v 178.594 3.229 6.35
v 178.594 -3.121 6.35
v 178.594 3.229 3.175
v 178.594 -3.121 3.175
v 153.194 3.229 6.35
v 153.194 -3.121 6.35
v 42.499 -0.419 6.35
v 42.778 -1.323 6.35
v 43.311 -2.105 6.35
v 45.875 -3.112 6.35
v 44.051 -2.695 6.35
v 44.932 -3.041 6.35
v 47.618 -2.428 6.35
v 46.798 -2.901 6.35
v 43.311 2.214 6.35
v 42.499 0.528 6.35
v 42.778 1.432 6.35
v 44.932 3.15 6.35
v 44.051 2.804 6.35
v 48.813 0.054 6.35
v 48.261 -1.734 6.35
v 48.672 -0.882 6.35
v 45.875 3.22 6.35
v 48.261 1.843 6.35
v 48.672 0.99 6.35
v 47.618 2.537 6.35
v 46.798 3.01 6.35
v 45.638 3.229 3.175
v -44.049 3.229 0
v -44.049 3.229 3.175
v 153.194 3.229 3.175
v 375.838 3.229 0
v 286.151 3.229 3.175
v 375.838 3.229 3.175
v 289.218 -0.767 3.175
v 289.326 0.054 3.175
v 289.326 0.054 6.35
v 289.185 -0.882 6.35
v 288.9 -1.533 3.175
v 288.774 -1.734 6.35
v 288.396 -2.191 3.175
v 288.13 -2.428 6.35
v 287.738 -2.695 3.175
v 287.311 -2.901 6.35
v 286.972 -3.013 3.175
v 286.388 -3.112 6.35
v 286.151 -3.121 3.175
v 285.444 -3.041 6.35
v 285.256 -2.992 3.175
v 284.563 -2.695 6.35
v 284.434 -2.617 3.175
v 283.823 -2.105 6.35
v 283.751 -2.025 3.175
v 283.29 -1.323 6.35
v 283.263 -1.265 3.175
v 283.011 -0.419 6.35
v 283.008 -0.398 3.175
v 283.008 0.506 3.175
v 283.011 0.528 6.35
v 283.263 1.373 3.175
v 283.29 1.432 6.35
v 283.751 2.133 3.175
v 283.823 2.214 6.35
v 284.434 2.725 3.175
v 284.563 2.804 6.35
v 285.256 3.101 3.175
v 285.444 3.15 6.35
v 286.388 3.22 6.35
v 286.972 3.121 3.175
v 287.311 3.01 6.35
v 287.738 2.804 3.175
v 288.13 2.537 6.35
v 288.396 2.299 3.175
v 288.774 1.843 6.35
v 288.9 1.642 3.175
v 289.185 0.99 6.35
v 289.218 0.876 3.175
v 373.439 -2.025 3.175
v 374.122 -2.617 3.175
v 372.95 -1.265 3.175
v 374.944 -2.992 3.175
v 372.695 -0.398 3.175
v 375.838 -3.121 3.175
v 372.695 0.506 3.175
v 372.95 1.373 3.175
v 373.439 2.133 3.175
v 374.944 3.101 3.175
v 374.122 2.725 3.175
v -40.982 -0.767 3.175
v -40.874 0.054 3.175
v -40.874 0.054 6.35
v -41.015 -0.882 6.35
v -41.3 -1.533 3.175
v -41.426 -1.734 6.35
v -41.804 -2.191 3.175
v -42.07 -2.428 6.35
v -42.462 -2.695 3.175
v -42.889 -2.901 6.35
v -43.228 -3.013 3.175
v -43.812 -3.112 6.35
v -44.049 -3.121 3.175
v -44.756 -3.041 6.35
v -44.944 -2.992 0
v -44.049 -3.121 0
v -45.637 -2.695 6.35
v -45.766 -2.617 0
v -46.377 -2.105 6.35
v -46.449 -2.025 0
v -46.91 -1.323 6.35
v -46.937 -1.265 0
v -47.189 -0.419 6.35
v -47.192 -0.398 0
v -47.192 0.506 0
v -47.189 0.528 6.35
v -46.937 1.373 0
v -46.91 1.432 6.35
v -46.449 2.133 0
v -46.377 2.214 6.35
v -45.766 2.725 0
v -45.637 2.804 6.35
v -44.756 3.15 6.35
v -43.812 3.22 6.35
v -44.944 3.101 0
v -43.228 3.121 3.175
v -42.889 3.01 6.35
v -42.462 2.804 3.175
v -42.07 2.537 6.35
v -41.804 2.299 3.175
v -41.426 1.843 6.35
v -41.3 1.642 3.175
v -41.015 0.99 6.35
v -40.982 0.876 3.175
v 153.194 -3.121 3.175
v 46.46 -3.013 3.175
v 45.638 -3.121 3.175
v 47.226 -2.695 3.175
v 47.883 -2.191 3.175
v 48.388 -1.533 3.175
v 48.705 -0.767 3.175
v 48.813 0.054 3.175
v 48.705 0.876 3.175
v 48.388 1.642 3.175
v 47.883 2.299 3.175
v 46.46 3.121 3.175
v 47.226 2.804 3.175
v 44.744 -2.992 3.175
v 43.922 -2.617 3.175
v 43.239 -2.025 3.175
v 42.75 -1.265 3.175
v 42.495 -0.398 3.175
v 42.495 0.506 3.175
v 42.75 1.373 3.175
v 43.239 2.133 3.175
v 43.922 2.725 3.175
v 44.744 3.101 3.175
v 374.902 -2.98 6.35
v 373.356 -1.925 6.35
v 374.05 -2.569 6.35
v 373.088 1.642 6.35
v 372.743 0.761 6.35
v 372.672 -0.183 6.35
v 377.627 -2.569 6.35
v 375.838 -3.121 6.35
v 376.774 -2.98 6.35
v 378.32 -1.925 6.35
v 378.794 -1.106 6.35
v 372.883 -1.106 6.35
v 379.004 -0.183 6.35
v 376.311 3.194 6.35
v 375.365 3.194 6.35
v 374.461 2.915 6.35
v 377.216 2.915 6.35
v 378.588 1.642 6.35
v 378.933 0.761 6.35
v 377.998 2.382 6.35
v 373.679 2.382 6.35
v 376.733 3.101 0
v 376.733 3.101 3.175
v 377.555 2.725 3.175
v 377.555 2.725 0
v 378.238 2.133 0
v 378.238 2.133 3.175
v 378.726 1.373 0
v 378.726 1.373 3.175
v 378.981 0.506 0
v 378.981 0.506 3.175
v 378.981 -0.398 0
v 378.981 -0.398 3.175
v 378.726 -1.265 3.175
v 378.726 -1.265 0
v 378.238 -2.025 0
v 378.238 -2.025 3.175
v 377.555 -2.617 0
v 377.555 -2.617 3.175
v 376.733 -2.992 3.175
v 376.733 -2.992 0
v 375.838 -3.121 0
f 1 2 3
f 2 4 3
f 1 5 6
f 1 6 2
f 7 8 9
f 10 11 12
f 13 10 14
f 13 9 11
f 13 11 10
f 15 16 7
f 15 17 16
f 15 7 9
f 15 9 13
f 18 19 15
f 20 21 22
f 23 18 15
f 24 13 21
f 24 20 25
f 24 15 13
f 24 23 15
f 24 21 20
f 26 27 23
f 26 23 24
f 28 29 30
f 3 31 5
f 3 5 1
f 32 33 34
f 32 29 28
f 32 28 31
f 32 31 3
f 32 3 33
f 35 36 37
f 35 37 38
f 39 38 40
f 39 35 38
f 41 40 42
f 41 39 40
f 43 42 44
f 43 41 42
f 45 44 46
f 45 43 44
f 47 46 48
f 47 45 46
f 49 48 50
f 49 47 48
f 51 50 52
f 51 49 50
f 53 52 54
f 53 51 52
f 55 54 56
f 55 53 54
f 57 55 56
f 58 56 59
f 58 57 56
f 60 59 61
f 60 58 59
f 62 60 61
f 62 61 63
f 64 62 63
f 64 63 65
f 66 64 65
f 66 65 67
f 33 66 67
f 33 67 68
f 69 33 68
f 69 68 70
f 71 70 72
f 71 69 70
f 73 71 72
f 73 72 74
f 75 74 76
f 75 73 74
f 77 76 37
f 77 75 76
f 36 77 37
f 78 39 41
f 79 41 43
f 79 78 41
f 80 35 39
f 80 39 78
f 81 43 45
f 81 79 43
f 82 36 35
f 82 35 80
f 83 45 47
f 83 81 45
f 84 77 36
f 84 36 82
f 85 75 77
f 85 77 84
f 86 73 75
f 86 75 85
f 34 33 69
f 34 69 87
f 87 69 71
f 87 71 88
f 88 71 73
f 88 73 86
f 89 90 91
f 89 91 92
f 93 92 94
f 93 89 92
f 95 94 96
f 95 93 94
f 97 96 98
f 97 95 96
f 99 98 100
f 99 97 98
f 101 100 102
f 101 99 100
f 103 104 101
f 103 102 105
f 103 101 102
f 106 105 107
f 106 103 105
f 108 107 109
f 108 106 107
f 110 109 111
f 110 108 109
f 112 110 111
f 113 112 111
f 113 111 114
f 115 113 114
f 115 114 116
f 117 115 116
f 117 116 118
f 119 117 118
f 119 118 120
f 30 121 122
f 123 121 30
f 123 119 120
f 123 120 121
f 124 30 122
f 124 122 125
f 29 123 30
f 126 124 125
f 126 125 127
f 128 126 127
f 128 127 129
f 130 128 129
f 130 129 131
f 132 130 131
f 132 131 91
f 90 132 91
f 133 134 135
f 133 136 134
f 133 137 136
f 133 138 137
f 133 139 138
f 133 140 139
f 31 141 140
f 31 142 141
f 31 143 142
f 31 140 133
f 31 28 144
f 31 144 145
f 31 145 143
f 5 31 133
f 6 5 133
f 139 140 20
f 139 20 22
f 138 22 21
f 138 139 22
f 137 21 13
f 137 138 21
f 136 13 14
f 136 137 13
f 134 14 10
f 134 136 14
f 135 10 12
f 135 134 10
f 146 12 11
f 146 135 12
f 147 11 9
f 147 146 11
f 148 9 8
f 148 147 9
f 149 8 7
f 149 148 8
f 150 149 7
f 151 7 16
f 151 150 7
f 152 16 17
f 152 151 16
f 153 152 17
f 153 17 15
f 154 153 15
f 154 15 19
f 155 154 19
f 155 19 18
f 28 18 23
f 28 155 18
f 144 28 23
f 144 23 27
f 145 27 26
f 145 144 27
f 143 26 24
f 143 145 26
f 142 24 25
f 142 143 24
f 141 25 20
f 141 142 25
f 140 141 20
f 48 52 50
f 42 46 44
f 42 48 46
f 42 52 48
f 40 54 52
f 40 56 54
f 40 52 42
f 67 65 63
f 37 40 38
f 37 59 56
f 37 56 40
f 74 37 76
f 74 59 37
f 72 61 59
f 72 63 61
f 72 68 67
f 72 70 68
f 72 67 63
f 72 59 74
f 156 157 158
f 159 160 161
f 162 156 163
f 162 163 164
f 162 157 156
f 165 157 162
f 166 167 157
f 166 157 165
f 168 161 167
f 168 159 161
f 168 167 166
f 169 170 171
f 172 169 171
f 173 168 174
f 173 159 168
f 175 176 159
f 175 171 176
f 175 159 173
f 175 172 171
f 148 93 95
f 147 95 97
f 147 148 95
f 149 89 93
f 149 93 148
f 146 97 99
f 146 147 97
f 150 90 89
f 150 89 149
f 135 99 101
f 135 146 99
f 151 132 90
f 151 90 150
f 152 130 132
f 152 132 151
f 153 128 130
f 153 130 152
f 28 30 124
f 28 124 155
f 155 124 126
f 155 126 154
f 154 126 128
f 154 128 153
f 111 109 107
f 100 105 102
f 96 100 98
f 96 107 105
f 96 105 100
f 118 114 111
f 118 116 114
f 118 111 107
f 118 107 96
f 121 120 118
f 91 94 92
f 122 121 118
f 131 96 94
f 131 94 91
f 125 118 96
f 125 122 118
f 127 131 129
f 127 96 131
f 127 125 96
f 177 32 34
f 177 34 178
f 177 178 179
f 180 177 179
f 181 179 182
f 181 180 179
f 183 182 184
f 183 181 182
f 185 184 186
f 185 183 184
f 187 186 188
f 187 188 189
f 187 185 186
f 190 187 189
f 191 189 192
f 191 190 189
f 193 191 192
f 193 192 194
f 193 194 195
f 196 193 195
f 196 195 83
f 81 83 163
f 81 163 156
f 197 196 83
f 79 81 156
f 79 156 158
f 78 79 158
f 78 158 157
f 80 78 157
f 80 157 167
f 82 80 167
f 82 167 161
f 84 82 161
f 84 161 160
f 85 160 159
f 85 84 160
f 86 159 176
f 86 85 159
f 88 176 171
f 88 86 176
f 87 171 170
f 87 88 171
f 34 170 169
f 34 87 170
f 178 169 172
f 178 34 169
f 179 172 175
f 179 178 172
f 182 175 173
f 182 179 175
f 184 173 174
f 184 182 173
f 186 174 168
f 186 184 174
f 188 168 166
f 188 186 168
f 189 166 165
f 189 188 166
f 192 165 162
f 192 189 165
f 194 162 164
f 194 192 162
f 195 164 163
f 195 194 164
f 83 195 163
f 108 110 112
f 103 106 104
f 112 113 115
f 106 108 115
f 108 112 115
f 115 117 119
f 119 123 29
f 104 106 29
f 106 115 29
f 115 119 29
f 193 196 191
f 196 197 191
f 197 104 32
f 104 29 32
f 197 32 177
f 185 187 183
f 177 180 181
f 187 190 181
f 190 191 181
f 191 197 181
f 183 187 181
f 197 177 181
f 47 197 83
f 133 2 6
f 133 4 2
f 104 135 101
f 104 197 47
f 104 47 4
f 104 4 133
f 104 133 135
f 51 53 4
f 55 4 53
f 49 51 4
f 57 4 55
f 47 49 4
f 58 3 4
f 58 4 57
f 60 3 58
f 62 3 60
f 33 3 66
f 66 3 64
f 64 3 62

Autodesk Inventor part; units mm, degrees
ref_plane "YZ Plane" through (0, 0, 0) normal (1, 0, 0) x (0, 1, 0)
ref_plane "XZ Plane" through (0, 0, 0) normal (0, 1, 0) x (-1, 0, 0)
ref_plane "XY Plane" through (0, 0, 0) normal (0, 0, 1) x (1, 0, 0)
sketch "Sketch1" plane through (0, 0, 0) normal (0, 0, 1) x (1, 0, 0)
  line L0 (-44.0493, 3.2293) -> (375.8381, 3.2293)
  line L1 (375.8381, 3.2293) -> (375.8381, -3.1207)
  line L2 (375.8381, -3.1207) -> (-44.0493, -3.1207)
  line L3 (-44.0493, -3.1207) -> (-44.0493, 3.2293)
  circle A0 centre (-44.0493, 0.0543) radius 3.175
  circle A1 centre (375.8381, 0.0543) radius 3.175
  point P0 (0, 0)
  dimension "d0" = 419.8874
  dimension "d1" = 6.35
extrude "Extrusion1" add sketch "Sketch1" along normal blind 3.175
sketch "Sketch2" plane through (0, 0, 3.175) normal (0, 0, 1) x (1, 0, 0)
  arc A0 (375.8381, -3.1207) -> (375.8381, 3.2293) centre (375.8381, 0.0543) ccw projected
  line L0 (-44.0493, 3.2293) -> (375.8381, 3.2293) projected
  arc A1 (-44.0493, 3.2293) -> (-44.0493, -3.1207) centre (-44.0493, 0.0543) ccw projected
  line L1 (375.8381, -3.1207) -> (-44.0493, -3.1207) projected
  circle A2 centre (-44.0493, 0.0543) radius 3.175
  circle A3 centre (375.8381, 0.0543) radius 3.175
  line L2 (-44.0493, 0.0543) -> (45.6381, 0.0543)
  circle A4 centre (45.6381, 0.0543) radius 3.175
  line L3 (375.8381, 0.0543) -> (286.1507, 0.0543)
  circle A5 centre (286.1507, 0.0543) radius 3.175
  line L4 (45.6381, 0.0543) -> (286.1507, 0.0543)
  line L5 (45.6381, 3.2293) -> (286.1507, -3.1207)
  line L6 (165.8944, 0.0543) -> (165.8944, -3.1207)
  line L7 (165.8944, -3.1207) -> (153.1944, -3.1207)
  line L8 (153.1944, -3.1207) -> (178.5944, -3.1207)
  line L9 (178.5944, -3.1207) -> (178.5944, 3.2293)
  line L10 (178.5944, 3.2293) -> (153.1944, 3.2293)
  line L11 (153.1944, 3.2293) -> (153.1944, -3.1207)
  point P0 (0, 0)
  dimension "d4" = 89.6874
  dimension "d5" = 89.6874
  dimension "d6" = 12.7
  dimension "d7" = 25.4
extrude "Extrusion2" add sketch "Sketch2" along normal blind 3.175 contours A3 A0 | A5 L4 L3 | L1 L6 L5 L9 | L3 L4 A5 | L5 L4 L9 | L1 L11 L4 L6 | L4 L5 L11 L0 L9 | L4 L11 L5 | A4 L4 L2 | A4 L2 L4 | A1 A2
properties part number "connection2"
